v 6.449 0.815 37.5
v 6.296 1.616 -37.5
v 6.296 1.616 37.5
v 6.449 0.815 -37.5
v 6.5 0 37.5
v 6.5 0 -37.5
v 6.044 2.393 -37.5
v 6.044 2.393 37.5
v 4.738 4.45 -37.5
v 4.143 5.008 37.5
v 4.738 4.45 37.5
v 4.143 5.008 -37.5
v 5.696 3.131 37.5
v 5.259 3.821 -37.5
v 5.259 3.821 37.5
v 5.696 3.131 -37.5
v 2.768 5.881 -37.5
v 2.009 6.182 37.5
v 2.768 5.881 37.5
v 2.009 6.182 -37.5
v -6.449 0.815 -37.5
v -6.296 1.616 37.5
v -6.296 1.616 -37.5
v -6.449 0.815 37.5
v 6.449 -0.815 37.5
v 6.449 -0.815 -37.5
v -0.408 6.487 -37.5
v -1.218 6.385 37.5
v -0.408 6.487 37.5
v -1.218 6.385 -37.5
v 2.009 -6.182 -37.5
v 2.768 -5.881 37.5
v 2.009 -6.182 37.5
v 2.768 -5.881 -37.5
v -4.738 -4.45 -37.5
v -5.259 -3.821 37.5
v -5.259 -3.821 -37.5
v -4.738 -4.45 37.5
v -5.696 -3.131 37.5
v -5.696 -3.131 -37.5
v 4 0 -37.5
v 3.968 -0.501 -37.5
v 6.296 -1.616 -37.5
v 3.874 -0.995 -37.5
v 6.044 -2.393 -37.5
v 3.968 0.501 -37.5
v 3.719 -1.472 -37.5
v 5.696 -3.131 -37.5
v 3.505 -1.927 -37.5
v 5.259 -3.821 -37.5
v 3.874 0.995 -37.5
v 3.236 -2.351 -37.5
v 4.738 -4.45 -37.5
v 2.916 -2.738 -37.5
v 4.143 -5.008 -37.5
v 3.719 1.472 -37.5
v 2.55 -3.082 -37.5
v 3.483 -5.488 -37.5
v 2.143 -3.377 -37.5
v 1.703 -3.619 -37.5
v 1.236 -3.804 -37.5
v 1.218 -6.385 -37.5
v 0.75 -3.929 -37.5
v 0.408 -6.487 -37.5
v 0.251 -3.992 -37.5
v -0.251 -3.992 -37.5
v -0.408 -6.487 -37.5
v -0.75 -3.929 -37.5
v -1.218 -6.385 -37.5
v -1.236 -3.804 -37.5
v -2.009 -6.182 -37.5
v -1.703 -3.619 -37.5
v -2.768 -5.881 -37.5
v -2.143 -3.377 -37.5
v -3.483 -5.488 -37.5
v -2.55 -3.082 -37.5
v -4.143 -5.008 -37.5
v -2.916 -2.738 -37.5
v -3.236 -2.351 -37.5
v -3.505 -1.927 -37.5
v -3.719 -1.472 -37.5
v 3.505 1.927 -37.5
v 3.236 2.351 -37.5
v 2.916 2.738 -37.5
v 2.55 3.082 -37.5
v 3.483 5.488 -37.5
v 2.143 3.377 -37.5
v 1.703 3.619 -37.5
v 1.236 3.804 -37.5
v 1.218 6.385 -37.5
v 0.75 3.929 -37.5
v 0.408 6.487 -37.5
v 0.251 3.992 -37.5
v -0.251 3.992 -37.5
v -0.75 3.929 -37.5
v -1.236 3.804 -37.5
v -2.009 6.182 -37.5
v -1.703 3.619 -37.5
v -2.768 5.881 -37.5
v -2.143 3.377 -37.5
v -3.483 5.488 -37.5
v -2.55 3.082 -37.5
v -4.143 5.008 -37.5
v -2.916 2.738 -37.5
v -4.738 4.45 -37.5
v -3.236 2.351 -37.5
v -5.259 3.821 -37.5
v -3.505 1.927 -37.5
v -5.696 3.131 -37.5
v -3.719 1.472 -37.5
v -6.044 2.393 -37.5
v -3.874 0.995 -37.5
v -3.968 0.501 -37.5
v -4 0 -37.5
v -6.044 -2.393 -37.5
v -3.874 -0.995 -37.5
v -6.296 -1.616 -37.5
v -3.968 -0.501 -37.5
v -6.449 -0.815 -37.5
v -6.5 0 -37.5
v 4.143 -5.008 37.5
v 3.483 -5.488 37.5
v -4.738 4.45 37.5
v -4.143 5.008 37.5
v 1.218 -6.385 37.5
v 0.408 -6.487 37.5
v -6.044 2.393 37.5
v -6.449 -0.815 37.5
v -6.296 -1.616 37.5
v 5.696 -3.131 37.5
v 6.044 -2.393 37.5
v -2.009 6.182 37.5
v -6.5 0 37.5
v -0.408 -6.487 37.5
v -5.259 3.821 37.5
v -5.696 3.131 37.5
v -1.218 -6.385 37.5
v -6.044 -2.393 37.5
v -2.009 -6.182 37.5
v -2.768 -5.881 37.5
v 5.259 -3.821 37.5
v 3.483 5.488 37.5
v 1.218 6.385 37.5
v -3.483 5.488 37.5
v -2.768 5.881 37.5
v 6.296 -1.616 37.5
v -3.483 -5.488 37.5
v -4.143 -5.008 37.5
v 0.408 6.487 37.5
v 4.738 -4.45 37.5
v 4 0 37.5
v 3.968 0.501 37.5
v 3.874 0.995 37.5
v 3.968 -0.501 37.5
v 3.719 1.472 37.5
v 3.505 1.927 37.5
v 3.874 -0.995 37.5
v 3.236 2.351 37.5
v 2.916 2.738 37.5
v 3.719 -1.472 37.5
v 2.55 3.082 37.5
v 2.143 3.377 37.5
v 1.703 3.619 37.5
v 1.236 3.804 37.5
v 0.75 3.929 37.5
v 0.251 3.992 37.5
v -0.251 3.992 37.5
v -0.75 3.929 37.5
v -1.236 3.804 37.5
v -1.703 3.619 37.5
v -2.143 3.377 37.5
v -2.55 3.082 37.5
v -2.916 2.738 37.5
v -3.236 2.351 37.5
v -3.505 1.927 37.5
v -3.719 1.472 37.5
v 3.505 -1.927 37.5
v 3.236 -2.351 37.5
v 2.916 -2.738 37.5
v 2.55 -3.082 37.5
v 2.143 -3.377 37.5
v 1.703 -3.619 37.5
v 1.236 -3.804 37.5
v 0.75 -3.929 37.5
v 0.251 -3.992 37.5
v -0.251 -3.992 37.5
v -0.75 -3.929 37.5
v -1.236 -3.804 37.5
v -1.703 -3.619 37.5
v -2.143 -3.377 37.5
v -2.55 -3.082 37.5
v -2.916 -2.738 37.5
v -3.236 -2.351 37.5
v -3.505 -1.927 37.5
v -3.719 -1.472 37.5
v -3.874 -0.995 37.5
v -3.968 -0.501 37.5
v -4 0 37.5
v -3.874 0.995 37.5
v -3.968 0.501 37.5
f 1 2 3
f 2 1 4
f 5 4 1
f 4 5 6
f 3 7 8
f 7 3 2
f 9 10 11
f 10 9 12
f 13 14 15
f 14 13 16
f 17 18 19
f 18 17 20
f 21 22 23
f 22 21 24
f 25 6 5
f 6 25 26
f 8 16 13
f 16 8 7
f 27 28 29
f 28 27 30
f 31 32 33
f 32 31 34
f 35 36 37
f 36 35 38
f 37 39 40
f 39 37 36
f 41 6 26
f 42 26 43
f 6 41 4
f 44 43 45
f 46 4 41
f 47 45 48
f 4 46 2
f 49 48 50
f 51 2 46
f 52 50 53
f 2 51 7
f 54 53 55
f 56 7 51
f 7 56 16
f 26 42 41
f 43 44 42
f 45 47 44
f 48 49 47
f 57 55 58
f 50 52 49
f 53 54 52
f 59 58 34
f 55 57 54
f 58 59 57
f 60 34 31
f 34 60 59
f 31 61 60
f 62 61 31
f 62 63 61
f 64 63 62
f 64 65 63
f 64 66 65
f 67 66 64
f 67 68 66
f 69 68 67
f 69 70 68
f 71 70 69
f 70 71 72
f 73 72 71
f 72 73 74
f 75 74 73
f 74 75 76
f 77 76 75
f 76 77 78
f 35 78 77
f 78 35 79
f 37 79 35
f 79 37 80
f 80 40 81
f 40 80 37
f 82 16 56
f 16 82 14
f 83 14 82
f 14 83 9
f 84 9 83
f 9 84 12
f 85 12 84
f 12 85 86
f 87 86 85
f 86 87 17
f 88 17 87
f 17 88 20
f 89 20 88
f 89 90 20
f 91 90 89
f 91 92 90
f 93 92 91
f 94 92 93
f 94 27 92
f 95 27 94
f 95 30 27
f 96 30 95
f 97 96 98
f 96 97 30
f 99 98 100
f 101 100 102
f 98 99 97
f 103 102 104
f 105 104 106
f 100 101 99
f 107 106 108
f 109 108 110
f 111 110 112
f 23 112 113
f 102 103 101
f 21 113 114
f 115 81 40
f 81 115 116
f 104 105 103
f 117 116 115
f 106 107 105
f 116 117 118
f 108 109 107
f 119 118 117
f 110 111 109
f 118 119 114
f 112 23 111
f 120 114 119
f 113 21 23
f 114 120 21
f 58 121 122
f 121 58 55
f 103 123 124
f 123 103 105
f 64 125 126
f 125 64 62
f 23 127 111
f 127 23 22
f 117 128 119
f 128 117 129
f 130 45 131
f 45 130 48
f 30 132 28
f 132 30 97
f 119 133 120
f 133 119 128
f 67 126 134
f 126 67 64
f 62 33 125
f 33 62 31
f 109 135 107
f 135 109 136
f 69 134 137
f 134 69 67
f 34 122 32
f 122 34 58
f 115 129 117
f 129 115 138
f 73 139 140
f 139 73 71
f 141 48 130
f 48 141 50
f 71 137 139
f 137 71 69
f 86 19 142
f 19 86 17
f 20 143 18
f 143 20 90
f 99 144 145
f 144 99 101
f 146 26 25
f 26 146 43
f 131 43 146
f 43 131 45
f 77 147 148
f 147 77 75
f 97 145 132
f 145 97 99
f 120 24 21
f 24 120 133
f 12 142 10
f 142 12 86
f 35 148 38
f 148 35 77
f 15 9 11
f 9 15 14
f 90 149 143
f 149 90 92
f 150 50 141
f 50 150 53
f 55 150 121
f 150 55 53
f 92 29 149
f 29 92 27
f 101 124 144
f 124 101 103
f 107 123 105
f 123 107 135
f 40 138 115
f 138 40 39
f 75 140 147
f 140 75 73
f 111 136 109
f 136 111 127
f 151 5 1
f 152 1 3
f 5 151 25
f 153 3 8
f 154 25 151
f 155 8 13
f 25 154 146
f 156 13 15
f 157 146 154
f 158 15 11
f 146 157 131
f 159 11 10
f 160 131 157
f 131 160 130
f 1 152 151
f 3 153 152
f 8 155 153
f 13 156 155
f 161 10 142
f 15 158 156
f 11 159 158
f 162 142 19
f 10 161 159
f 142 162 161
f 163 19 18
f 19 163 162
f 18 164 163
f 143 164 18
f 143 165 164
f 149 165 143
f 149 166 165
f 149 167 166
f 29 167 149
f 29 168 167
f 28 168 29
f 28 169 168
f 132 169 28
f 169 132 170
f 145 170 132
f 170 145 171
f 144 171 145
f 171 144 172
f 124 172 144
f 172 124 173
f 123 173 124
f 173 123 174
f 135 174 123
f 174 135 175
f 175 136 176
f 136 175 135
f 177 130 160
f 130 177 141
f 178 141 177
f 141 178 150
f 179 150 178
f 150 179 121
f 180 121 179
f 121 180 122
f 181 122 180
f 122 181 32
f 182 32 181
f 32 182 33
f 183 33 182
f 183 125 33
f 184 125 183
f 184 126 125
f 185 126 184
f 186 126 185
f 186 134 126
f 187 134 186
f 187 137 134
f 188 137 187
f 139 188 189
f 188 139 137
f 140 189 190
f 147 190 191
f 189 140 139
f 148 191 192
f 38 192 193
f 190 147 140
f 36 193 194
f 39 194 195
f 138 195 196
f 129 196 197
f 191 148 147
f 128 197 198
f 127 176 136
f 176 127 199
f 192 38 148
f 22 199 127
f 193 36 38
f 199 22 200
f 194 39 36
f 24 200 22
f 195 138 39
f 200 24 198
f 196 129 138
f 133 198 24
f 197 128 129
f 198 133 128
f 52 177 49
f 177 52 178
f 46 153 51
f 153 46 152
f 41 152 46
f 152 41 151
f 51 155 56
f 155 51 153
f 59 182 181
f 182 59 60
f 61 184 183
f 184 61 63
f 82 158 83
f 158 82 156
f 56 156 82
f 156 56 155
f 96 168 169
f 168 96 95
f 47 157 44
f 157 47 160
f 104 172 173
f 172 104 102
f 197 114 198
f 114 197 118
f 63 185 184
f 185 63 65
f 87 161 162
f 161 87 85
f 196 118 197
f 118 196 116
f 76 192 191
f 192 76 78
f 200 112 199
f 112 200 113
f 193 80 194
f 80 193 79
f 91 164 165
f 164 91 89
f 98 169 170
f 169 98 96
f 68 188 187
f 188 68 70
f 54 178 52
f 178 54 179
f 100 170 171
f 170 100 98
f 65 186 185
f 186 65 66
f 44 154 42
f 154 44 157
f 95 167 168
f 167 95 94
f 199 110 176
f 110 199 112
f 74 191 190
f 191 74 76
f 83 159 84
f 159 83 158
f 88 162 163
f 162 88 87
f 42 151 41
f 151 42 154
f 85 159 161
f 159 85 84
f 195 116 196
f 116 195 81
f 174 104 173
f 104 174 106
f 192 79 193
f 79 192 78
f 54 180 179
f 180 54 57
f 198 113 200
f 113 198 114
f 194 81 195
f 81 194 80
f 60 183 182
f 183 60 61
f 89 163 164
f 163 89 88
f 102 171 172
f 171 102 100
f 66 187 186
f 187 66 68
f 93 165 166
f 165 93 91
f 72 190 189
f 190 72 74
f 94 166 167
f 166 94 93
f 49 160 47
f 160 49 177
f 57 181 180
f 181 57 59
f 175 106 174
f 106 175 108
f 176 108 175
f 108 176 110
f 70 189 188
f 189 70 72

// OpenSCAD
$fn = 50;


difference() {
	union() {
		translate(v = [0, 0, -37.5000000000]) {
			cylinder(h = 75, r = 6.5000000000);
		}
	}
	union() {
		translate(v = [0, 0, -100.0000000000]) {
			cylinder(h = 200, r = 4.0000000000);
		}
	}
}
